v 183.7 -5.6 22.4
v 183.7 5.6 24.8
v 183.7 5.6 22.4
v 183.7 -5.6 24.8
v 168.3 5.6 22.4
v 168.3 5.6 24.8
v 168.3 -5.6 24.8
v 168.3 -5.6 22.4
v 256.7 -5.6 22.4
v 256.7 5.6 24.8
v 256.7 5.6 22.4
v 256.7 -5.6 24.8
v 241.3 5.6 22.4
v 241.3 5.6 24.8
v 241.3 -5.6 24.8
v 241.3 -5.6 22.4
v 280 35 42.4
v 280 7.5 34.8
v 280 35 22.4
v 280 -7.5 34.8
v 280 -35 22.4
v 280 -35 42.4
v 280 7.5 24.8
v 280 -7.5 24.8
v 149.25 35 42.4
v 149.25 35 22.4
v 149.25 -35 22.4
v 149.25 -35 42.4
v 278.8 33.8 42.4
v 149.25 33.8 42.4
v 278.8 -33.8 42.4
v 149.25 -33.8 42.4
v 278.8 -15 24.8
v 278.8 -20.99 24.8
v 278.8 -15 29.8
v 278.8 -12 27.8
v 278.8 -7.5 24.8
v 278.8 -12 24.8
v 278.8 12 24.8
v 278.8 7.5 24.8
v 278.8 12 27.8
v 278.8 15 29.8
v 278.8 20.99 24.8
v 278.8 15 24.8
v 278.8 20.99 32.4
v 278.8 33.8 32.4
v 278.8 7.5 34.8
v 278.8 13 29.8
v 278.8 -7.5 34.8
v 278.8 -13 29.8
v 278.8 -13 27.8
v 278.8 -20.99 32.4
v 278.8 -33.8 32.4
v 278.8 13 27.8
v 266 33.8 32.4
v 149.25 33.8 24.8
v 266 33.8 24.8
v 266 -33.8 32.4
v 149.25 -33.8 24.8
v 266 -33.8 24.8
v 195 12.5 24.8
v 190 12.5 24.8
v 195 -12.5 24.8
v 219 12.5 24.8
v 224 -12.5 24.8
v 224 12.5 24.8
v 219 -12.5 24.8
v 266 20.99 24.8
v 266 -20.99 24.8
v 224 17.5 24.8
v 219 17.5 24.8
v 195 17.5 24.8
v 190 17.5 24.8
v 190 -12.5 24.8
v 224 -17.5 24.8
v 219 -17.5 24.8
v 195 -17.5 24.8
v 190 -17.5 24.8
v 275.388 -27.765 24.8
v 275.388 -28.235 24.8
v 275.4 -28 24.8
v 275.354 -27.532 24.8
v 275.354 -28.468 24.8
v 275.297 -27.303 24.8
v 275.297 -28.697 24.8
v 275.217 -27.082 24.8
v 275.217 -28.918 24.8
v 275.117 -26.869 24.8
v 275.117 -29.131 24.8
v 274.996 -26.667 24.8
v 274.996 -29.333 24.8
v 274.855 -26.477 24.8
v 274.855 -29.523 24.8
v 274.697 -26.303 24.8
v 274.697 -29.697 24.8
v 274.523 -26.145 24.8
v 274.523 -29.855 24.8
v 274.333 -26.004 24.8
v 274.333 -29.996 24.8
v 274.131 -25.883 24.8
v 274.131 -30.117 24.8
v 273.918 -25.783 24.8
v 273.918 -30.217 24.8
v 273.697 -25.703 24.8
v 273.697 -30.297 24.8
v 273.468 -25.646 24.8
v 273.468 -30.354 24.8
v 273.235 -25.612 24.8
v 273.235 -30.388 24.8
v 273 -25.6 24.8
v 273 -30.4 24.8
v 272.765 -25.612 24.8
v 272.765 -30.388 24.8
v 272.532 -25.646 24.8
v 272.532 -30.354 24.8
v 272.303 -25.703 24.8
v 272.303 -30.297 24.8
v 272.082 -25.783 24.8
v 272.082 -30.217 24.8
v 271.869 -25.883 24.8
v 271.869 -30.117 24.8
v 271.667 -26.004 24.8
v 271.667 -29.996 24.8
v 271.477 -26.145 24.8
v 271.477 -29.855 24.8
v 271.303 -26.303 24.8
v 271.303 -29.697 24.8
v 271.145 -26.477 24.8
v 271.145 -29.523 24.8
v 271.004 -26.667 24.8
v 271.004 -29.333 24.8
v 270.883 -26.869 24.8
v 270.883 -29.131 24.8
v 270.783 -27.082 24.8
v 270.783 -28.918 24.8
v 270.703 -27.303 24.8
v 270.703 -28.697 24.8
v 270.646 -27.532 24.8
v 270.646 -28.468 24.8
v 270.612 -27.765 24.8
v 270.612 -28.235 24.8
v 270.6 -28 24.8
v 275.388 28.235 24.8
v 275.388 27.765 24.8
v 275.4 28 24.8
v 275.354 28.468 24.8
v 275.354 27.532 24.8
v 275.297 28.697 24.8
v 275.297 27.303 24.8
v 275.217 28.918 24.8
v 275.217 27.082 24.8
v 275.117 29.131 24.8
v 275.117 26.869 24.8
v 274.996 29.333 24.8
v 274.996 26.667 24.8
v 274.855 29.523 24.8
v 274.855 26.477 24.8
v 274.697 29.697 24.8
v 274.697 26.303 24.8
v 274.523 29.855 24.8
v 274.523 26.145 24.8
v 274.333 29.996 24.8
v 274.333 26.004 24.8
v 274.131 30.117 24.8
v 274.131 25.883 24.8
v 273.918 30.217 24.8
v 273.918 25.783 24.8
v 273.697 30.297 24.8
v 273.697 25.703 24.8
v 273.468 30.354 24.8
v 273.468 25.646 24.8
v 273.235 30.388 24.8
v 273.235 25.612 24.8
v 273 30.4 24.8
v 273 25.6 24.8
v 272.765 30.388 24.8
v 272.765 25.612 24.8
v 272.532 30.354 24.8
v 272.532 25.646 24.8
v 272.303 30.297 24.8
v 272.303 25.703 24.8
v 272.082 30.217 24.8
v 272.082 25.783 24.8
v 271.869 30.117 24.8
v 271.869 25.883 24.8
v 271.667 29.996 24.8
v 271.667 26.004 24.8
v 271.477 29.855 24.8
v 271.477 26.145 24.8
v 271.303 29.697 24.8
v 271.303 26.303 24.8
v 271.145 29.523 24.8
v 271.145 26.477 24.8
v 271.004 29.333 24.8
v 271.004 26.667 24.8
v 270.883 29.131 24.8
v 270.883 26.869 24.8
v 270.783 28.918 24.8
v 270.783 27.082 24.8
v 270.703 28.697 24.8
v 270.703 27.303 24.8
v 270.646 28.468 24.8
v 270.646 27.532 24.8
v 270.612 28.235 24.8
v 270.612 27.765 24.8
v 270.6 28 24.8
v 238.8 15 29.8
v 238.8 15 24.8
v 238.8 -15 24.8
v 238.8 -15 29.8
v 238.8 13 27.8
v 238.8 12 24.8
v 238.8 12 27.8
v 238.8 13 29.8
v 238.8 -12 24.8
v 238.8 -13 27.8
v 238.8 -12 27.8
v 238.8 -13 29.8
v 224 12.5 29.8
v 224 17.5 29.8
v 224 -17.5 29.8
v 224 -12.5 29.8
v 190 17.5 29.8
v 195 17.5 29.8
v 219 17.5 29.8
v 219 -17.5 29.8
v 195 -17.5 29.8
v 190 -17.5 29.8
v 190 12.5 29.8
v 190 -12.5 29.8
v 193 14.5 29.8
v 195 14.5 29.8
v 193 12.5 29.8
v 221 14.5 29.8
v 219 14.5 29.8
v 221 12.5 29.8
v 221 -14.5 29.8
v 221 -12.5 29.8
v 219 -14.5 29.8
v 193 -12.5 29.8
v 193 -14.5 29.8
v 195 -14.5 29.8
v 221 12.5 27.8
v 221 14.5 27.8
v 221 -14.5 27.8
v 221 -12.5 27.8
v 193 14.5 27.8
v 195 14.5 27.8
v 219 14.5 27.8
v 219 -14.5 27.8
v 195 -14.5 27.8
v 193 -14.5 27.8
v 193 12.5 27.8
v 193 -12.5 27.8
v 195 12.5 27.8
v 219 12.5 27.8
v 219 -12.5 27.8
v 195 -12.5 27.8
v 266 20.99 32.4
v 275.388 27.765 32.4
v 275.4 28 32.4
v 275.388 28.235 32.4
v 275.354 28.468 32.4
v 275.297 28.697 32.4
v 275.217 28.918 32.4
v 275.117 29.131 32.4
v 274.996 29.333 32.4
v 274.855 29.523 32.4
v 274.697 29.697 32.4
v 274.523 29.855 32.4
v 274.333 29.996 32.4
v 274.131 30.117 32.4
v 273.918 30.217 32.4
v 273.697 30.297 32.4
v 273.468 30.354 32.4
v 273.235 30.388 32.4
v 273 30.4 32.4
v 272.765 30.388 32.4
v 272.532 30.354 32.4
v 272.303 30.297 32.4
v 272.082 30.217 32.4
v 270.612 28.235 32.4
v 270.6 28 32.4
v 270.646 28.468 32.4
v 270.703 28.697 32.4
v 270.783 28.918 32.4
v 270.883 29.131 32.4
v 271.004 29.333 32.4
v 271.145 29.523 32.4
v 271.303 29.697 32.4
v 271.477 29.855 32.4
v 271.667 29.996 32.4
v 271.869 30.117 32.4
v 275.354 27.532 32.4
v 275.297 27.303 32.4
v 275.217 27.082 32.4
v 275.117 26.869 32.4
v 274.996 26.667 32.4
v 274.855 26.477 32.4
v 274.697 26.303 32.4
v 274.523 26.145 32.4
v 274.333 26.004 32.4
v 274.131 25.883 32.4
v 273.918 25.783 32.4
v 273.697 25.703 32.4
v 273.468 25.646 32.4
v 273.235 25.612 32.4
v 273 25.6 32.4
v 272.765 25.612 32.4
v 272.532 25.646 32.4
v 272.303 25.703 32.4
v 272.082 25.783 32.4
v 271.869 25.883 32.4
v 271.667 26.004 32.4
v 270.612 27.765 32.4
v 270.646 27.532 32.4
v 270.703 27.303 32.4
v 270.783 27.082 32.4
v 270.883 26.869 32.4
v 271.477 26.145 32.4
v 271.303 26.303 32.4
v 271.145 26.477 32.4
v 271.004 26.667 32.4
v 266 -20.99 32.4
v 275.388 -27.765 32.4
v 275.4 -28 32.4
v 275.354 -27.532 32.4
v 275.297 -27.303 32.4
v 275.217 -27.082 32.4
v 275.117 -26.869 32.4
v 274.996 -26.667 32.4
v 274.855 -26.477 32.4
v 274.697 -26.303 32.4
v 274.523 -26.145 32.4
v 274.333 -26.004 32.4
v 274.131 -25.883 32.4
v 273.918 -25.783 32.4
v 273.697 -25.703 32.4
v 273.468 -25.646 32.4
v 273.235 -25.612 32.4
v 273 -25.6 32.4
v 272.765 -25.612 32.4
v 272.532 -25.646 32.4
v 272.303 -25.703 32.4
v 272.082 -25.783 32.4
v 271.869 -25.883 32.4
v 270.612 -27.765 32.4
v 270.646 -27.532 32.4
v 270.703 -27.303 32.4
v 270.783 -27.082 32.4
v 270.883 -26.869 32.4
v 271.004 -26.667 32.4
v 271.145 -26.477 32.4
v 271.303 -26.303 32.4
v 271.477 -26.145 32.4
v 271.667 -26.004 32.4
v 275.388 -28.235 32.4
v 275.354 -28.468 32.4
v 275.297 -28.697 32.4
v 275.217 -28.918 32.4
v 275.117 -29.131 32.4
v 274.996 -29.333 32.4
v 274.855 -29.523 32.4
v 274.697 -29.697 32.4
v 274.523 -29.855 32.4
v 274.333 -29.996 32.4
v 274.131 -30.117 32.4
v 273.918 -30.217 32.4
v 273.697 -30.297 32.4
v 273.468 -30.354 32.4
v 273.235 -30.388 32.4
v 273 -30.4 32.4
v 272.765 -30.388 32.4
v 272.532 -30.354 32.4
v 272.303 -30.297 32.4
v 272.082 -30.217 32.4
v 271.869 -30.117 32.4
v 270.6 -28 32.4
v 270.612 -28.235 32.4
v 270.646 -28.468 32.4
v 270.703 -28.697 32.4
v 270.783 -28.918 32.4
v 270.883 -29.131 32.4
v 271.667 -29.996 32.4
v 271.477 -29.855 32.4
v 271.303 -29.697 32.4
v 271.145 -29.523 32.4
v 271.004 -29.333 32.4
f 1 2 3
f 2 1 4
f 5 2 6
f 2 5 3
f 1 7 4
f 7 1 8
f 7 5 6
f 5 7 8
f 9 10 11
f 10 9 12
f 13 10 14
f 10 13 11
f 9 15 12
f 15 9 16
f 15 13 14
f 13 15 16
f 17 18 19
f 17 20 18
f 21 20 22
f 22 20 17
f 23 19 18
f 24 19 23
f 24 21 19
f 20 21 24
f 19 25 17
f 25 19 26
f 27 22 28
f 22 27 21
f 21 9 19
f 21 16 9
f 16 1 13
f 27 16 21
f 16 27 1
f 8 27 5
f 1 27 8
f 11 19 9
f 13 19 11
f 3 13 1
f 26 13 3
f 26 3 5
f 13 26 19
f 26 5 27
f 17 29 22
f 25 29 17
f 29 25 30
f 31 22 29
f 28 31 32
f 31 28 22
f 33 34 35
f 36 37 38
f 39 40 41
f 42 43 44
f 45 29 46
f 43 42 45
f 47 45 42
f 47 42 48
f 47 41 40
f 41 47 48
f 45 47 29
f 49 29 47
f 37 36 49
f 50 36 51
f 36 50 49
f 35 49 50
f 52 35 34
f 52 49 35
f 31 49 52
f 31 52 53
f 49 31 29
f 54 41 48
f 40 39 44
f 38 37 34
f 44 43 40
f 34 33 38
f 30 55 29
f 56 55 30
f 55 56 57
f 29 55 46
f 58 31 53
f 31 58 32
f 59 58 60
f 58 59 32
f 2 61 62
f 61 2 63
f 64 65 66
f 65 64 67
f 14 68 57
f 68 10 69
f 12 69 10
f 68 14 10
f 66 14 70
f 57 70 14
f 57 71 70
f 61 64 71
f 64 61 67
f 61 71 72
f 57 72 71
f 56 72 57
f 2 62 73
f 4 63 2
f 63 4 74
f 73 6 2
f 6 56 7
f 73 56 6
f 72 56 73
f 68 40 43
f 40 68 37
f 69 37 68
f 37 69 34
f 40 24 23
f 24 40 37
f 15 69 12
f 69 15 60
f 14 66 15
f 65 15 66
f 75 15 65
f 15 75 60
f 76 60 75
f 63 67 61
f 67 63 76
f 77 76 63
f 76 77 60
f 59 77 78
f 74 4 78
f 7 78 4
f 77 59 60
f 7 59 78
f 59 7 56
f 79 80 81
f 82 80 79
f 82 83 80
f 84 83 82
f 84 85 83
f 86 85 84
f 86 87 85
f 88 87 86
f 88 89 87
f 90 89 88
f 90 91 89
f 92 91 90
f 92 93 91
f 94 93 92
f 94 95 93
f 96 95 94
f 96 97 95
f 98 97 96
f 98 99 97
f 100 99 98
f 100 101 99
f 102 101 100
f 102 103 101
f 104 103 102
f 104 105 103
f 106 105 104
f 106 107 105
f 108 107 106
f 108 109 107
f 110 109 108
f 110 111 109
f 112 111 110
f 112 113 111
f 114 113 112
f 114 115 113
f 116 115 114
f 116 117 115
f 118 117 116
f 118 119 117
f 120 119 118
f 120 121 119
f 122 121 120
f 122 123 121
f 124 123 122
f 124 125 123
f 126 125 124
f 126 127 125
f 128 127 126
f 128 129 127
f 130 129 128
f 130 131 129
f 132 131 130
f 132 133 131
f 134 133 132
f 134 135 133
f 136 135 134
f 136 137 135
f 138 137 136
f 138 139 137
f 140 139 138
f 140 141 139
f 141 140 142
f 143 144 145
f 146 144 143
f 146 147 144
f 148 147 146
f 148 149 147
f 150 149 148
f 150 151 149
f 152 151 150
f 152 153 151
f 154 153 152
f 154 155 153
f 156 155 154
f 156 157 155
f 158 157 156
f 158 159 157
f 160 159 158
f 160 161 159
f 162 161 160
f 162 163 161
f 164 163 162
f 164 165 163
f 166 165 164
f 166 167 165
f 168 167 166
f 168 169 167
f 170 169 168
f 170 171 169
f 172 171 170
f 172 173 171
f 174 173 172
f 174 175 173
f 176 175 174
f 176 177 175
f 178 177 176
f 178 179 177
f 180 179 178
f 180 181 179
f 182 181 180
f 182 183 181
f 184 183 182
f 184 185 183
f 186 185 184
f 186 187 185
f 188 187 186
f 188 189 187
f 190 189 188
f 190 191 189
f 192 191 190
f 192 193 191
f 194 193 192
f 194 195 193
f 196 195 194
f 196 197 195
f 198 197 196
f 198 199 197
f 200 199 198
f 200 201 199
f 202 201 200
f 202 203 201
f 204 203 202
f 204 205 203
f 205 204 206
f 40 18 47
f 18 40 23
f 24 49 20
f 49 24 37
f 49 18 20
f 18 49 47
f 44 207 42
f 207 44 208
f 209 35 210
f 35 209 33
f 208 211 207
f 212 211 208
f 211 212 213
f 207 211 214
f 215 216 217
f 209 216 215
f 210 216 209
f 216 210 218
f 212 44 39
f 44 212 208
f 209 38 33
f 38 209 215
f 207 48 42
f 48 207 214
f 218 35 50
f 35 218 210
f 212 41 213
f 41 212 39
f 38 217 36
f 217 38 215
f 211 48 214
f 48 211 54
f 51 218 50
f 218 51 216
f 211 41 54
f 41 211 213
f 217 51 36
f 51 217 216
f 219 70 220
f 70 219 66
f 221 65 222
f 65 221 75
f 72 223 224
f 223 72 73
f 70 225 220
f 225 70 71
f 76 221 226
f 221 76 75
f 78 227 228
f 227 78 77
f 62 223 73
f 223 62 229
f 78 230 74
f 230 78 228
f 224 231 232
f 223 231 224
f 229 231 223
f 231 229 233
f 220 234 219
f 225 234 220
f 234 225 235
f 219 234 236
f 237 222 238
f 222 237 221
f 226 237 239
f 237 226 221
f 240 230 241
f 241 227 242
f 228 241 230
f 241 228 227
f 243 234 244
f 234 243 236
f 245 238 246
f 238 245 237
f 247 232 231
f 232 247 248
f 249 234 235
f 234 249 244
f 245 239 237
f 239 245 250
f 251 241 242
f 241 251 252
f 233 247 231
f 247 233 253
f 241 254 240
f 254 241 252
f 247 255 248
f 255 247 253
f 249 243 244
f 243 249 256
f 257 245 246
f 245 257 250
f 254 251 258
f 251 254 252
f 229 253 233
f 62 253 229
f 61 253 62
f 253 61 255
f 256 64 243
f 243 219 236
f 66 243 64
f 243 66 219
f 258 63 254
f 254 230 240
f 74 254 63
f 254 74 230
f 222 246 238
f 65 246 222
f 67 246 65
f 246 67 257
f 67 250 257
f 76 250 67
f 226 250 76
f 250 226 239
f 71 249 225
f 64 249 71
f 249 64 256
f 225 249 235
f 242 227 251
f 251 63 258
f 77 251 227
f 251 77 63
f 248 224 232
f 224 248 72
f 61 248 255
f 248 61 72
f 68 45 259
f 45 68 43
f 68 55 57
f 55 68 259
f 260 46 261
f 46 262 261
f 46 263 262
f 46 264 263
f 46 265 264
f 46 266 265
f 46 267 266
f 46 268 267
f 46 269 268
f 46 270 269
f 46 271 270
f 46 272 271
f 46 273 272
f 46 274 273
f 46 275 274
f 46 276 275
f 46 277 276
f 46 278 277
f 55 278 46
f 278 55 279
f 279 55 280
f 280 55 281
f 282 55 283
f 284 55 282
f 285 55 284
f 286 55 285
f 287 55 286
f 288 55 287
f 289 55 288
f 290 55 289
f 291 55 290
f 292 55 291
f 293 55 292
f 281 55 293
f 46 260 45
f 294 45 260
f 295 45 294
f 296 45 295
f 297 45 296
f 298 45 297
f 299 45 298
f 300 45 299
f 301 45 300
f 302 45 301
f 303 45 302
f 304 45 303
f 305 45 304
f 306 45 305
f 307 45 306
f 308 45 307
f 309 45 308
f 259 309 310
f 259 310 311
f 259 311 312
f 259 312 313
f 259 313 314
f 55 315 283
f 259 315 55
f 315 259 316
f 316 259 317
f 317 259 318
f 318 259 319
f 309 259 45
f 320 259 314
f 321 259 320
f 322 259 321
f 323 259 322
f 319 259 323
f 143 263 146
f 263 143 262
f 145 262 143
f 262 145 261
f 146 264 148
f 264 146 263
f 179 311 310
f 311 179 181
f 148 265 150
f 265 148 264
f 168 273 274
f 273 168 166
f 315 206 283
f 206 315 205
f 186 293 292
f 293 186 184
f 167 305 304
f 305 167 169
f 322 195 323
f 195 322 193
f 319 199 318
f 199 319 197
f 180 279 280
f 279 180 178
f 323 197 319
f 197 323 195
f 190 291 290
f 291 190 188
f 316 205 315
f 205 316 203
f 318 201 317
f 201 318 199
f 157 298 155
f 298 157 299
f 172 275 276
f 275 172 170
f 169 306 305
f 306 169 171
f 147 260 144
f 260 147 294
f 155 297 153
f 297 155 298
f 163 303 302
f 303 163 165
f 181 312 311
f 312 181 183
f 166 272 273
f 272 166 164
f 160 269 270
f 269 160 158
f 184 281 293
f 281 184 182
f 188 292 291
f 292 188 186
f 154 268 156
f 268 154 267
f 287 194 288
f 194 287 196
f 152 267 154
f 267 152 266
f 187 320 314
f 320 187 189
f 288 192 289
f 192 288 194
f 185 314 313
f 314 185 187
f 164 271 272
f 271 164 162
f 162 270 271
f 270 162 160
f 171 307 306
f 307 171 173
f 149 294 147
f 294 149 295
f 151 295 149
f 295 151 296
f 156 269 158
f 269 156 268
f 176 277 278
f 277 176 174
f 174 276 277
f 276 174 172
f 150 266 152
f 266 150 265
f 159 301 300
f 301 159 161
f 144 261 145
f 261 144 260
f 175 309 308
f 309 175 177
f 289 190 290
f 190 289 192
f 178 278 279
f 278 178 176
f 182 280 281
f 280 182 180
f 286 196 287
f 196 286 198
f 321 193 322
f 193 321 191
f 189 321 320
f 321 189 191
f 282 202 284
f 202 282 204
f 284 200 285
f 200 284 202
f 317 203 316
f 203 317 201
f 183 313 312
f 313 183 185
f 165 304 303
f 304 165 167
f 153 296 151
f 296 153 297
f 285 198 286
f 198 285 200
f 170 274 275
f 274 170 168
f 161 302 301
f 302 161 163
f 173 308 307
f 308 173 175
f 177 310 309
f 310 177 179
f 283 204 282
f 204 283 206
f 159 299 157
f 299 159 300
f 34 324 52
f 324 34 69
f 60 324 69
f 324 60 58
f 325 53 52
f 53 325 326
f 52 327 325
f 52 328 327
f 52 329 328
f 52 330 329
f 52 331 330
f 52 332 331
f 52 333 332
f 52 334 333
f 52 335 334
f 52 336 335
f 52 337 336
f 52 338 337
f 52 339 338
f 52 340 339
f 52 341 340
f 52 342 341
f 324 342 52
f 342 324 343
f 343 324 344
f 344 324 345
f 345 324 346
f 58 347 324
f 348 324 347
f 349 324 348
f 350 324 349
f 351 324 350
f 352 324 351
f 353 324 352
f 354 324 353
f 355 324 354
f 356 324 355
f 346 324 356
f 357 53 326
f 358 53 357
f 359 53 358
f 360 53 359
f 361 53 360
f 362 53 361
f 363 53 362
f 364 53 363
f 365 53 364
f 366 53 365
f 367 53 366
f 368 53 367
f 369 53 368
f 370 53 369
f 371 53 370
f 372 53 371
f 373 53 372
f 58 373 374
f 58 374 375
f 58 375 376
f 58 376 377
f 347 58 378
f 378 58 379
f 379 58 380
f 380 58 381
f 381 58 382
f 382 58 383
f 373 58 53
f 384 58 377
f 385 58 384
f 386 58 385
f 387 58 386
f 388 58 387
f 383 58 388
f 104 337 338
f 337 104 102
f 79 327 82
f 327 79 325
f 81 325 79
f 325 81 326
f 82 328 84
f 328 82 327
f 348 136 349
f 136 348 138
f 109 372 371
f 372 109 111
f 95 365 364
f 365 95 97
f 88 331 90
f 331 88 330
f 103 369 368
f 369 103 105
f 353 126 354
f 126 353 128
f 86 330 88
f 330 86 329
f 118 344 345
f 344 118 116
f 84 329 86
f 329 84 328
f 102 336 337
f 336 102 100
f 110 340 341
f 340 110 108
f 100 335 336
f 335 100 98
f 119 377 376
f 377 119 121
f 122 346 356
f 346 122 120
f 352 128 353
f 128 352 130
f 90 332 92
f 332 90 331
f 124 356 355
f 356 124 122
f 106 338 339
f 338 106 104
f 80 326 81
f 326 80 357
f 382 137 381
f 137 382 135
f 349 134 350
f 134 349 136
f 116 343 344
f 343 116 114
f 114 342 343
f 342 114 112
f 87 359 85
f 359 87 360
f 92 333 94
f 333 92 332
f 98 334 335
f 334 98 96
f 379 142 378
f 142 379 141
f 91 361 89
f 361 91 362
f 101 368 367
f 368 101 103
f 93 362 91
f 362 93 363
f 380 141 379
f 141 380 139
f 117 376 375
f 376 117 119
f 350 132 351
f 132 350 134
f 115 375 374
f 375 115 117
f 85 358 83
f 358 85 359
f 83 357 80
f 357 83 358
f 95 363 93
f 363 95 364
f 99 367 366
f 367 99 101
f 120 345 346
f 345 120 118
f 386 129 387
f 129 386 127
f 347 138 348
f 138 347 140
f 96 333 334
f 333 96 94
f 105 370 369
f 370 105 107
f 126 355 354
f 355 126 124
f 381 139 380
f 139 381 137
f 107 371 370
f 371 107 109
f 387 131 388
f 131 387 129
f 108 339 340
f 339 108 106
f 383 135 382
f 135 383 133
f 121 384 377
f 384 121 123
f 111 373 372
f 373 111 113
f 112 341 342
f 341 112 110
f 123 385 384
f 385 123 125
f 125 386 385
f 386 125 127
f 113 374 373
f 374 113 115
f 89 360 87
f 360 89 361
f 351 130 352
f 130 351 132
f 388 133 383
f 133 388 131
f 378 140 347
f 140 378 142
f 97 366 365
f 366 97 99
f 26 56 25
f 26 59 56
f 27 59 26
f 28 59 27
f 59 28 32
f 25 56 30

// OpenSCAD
// file: 7segment.scad
module sevenSegment
(
  tilt = 5,
  corner = 8,
  sizeY = 80,
  sizeX = 46,
  width = 12,
  barrier = 1.7,
  heigth = 16,
  gaps = true,
)
{
  module hd_lb(d=barrier)
  {
    translate([barrier/2+sin(tilt)*(width-corner)+width-corner,width-corner+barrier/2,-1]) cylinder(d=d, h=heigth+2);
  }
  module hd_lh(d=barrier)
  {
    translate([barrier/2+sin(tilt)*(width-corner+(sizeY-3*width)/2)+width-corner,width-corner+(sizeY-3*width)/2-barrier/2,-1]) cylinder(d=d, h=heigth+2); 
  }
  module hd_rh(d=barrier)
  {
    translate([sin(tilt)*(width-corner+(sizeY-3*width)/2)+sizeX-corner-width-barrier/2,width-corner+(sizeY-3*width)/2-barrier/2,-1]) cylinder(d=d, h=heigth+2);
  }
  module hd_rb(d=barrier)
  {
    translate([sin(tilt)*(width-corner)+sizeX-corner-width-barrier/2,width-corner+barrier/2,-1]) cylinder(d=d, h=heigth+2);
  }
  module hh_lb(d=barrier)
  {
    translate([sin(tilt)*(2*width-corner+(sizeY-3*width)/2)+width-corner+barrier/2,2*width-corner+(sizeY-3*width)/2+barrier/2,-1]) cylinder(d=d, h=heigth+2);
  }
  module hh_lh(d=barrier)
  {
    translate([sin(tilt)*(sizeY-corner-width)+width-corner+barrier/2,sizeY-corner-width-barrier/2,-1]) cylinder(d=d, h=heigth+2);
  }
  module hh_rh(d=barrier)
  {
    translate([sin(tilt)*(sizeY-corner-width)+sizeX-corner-width-barrier/2,sizeY-corner-width-barrier/2,-1]) cylinder(d=d, h=heigth+2);
  }
  module hh_rb(d=barrier)
  {
    translate([sin(tilt)*(2*width-corner+(sizeY-3*width)/2)+sizeX-corner-width-barrier/2,2*width-corner+(sizeY-3*width)/2+barrier/2,-1]) cylinder(d=d, h=heigth+2);
  }
  module l_md(d=barrier)
  {
    translate([sin(tilt)*(sizeY/2-corner)+width/3-corner,sizeY/2-corner,-1]) cylinder(d=d, h=heigth+2);
  }
  module r_md(d=barrier)
  {
    translate([sin(tilt)*(sizeY/2-corner)+sizeX-width/3-corner,sizeY/2-corner,-1]) cylinder(d=d, h=heigth+2);
  }

  translate([corner,corner,0])
  {
    difference()
    {
      hull()
      {
        cylinder(r=corner, h=heigth);
        translate([(sizeY-2*corner)*sin(tilt),sizeY-2*corner,0]) cylinder(r=corner, h=heigth);
        translate([(sizeX-2*corner)+(sizeY-2*corner)*sin(tilt),sizeY-2*corner,0]) cylinder(r=corner, h=heigth);
        translate([(sizeX-2*corner),0,0]) cylinder(r=corner, h=heigth);
      }
      hull() { hd_lb(); hd_lh(); hd_rh(); hd_rb(); }
      hull() { hh_lb(); hh_lh(); hh_rh(); hh_rb(); }
      
      if (gaps)
      {
        hull() { hd_lb(); translate([-2*width,-2*width,0]) hd_lb(); }
        hull() { hd_rb(); translate([2*width,-2*width,0]) hd_rb(); }
        hull() { hh_lh(); translate([-2*width,2*width,0]) hh_lh(); }
        hull() { hh_rh(); translate([2*width,2*width,0]) hh_rh(); }

        hull() { hh_lb(); l_md(); }
        hull() { hd_lh(); l_md(); }
        hull() { l_md(); translate([-width*1.5,0,0]) l_md(d=barrier); }
        hull() { hh_rb(); r_md(); }
        hull() { hd_rh(); r_md(); }
        hull() { r_md(); translate([width*1.5,0,0]) r_md(d=barrier); }
      }
    }
  }
}



/*
 *
 * demo code
 * 
 */

translate([-120,0,0]) sevenSegment(sizeY = 80*2, sizeX = 46*2, width = 24);

//color ("black") 

color("lightgrey") translate([(3+1)/2,(3+1)/2,0.01])  sevenSegment(
    tilt = 5,
    corner = 8-(3+1)/2,
    sizeY = 100-3-1,
    sizeX = 55-3-1,
    width = 14-3-1,
    barrier = 1.7+1,
    heigth = 15,
    gaps = true
  );

color ("black") 

translate([70,0,0]) difference()
{
  sevenSegment( sizeY = 100, sizeX = 55, width = 14, heigth = 5,gaps = false);
  translate([3/2,3/2,-1])
  sevenSegment(
    tilt = 5,
    corner = 8-3/2,
    sizeY = 100-3,
    sizeX = 55-3,
    width = 14-3,
    barrier = 1.7,
    heigth = 5+2,
    gaps = true
  );
}

translate([70,0,80]) color("lightgrey") translate([(3+1)/2,(3+1)/2,0.01])  sevenSegment(
    tilt = 5,
    corner = 8-(3+1)/2,
    sizeY = 100-3-1,
    sizeX = 55-3-1,
    width = 14-3-1,
    barrier = 1.7+1,
    heigth = 15,
    gaps = true
  );



//translate([140,0,0]) sevenSegment();
translate([140,0,0]) sevenSegment(sizeY = 80*0.6, sizeX = 46*0.6, width = 8, tilt = 0);
translate([175,0,0]) sevenSegment(sizeY = 80*0.6, sizeX = 46*0.6, width = 8, tilt = 10);
translate([210,0,0]) sevenSegment(sizeY = 80*0.6, sizeX = 46*0.6, width = 8, tilt = 20);
translate([245,0,0]) sevenSegment(sizeY = 80*0.6, sizeX = 46*0.6, width = 8, tilt = 30);

translate([300,0,0]) difference()
{
  sevenSegment( sizeY = 100, sizeX = 55, width = 14, gaps = false);
  translate([4/2,4/2,-1])
  sevenSegment(
    tilt = 5,
    corner = 8-4/2,
    sizeY = 100-4,
    sizeX = 55-4,
    width = 14-4,
    barrier = 1.7,
    heigth = 16+2,
    gaps = true
  );
  translate([3/2,3/2,16-2])
  sevenSegment(
    tilt = 5,
    corner = 8-3/2,
    sizeY = 100-3,
    sizeX = 55-3,
    width = 14-3,
    barrier = 1.7-(4-3),
    heigth = 3,
    gaps = true
  );
}
// main file
$fn = 64;
use <clock.scad>
rotate ([-90,0,0]) 
  stand_2of_3();
